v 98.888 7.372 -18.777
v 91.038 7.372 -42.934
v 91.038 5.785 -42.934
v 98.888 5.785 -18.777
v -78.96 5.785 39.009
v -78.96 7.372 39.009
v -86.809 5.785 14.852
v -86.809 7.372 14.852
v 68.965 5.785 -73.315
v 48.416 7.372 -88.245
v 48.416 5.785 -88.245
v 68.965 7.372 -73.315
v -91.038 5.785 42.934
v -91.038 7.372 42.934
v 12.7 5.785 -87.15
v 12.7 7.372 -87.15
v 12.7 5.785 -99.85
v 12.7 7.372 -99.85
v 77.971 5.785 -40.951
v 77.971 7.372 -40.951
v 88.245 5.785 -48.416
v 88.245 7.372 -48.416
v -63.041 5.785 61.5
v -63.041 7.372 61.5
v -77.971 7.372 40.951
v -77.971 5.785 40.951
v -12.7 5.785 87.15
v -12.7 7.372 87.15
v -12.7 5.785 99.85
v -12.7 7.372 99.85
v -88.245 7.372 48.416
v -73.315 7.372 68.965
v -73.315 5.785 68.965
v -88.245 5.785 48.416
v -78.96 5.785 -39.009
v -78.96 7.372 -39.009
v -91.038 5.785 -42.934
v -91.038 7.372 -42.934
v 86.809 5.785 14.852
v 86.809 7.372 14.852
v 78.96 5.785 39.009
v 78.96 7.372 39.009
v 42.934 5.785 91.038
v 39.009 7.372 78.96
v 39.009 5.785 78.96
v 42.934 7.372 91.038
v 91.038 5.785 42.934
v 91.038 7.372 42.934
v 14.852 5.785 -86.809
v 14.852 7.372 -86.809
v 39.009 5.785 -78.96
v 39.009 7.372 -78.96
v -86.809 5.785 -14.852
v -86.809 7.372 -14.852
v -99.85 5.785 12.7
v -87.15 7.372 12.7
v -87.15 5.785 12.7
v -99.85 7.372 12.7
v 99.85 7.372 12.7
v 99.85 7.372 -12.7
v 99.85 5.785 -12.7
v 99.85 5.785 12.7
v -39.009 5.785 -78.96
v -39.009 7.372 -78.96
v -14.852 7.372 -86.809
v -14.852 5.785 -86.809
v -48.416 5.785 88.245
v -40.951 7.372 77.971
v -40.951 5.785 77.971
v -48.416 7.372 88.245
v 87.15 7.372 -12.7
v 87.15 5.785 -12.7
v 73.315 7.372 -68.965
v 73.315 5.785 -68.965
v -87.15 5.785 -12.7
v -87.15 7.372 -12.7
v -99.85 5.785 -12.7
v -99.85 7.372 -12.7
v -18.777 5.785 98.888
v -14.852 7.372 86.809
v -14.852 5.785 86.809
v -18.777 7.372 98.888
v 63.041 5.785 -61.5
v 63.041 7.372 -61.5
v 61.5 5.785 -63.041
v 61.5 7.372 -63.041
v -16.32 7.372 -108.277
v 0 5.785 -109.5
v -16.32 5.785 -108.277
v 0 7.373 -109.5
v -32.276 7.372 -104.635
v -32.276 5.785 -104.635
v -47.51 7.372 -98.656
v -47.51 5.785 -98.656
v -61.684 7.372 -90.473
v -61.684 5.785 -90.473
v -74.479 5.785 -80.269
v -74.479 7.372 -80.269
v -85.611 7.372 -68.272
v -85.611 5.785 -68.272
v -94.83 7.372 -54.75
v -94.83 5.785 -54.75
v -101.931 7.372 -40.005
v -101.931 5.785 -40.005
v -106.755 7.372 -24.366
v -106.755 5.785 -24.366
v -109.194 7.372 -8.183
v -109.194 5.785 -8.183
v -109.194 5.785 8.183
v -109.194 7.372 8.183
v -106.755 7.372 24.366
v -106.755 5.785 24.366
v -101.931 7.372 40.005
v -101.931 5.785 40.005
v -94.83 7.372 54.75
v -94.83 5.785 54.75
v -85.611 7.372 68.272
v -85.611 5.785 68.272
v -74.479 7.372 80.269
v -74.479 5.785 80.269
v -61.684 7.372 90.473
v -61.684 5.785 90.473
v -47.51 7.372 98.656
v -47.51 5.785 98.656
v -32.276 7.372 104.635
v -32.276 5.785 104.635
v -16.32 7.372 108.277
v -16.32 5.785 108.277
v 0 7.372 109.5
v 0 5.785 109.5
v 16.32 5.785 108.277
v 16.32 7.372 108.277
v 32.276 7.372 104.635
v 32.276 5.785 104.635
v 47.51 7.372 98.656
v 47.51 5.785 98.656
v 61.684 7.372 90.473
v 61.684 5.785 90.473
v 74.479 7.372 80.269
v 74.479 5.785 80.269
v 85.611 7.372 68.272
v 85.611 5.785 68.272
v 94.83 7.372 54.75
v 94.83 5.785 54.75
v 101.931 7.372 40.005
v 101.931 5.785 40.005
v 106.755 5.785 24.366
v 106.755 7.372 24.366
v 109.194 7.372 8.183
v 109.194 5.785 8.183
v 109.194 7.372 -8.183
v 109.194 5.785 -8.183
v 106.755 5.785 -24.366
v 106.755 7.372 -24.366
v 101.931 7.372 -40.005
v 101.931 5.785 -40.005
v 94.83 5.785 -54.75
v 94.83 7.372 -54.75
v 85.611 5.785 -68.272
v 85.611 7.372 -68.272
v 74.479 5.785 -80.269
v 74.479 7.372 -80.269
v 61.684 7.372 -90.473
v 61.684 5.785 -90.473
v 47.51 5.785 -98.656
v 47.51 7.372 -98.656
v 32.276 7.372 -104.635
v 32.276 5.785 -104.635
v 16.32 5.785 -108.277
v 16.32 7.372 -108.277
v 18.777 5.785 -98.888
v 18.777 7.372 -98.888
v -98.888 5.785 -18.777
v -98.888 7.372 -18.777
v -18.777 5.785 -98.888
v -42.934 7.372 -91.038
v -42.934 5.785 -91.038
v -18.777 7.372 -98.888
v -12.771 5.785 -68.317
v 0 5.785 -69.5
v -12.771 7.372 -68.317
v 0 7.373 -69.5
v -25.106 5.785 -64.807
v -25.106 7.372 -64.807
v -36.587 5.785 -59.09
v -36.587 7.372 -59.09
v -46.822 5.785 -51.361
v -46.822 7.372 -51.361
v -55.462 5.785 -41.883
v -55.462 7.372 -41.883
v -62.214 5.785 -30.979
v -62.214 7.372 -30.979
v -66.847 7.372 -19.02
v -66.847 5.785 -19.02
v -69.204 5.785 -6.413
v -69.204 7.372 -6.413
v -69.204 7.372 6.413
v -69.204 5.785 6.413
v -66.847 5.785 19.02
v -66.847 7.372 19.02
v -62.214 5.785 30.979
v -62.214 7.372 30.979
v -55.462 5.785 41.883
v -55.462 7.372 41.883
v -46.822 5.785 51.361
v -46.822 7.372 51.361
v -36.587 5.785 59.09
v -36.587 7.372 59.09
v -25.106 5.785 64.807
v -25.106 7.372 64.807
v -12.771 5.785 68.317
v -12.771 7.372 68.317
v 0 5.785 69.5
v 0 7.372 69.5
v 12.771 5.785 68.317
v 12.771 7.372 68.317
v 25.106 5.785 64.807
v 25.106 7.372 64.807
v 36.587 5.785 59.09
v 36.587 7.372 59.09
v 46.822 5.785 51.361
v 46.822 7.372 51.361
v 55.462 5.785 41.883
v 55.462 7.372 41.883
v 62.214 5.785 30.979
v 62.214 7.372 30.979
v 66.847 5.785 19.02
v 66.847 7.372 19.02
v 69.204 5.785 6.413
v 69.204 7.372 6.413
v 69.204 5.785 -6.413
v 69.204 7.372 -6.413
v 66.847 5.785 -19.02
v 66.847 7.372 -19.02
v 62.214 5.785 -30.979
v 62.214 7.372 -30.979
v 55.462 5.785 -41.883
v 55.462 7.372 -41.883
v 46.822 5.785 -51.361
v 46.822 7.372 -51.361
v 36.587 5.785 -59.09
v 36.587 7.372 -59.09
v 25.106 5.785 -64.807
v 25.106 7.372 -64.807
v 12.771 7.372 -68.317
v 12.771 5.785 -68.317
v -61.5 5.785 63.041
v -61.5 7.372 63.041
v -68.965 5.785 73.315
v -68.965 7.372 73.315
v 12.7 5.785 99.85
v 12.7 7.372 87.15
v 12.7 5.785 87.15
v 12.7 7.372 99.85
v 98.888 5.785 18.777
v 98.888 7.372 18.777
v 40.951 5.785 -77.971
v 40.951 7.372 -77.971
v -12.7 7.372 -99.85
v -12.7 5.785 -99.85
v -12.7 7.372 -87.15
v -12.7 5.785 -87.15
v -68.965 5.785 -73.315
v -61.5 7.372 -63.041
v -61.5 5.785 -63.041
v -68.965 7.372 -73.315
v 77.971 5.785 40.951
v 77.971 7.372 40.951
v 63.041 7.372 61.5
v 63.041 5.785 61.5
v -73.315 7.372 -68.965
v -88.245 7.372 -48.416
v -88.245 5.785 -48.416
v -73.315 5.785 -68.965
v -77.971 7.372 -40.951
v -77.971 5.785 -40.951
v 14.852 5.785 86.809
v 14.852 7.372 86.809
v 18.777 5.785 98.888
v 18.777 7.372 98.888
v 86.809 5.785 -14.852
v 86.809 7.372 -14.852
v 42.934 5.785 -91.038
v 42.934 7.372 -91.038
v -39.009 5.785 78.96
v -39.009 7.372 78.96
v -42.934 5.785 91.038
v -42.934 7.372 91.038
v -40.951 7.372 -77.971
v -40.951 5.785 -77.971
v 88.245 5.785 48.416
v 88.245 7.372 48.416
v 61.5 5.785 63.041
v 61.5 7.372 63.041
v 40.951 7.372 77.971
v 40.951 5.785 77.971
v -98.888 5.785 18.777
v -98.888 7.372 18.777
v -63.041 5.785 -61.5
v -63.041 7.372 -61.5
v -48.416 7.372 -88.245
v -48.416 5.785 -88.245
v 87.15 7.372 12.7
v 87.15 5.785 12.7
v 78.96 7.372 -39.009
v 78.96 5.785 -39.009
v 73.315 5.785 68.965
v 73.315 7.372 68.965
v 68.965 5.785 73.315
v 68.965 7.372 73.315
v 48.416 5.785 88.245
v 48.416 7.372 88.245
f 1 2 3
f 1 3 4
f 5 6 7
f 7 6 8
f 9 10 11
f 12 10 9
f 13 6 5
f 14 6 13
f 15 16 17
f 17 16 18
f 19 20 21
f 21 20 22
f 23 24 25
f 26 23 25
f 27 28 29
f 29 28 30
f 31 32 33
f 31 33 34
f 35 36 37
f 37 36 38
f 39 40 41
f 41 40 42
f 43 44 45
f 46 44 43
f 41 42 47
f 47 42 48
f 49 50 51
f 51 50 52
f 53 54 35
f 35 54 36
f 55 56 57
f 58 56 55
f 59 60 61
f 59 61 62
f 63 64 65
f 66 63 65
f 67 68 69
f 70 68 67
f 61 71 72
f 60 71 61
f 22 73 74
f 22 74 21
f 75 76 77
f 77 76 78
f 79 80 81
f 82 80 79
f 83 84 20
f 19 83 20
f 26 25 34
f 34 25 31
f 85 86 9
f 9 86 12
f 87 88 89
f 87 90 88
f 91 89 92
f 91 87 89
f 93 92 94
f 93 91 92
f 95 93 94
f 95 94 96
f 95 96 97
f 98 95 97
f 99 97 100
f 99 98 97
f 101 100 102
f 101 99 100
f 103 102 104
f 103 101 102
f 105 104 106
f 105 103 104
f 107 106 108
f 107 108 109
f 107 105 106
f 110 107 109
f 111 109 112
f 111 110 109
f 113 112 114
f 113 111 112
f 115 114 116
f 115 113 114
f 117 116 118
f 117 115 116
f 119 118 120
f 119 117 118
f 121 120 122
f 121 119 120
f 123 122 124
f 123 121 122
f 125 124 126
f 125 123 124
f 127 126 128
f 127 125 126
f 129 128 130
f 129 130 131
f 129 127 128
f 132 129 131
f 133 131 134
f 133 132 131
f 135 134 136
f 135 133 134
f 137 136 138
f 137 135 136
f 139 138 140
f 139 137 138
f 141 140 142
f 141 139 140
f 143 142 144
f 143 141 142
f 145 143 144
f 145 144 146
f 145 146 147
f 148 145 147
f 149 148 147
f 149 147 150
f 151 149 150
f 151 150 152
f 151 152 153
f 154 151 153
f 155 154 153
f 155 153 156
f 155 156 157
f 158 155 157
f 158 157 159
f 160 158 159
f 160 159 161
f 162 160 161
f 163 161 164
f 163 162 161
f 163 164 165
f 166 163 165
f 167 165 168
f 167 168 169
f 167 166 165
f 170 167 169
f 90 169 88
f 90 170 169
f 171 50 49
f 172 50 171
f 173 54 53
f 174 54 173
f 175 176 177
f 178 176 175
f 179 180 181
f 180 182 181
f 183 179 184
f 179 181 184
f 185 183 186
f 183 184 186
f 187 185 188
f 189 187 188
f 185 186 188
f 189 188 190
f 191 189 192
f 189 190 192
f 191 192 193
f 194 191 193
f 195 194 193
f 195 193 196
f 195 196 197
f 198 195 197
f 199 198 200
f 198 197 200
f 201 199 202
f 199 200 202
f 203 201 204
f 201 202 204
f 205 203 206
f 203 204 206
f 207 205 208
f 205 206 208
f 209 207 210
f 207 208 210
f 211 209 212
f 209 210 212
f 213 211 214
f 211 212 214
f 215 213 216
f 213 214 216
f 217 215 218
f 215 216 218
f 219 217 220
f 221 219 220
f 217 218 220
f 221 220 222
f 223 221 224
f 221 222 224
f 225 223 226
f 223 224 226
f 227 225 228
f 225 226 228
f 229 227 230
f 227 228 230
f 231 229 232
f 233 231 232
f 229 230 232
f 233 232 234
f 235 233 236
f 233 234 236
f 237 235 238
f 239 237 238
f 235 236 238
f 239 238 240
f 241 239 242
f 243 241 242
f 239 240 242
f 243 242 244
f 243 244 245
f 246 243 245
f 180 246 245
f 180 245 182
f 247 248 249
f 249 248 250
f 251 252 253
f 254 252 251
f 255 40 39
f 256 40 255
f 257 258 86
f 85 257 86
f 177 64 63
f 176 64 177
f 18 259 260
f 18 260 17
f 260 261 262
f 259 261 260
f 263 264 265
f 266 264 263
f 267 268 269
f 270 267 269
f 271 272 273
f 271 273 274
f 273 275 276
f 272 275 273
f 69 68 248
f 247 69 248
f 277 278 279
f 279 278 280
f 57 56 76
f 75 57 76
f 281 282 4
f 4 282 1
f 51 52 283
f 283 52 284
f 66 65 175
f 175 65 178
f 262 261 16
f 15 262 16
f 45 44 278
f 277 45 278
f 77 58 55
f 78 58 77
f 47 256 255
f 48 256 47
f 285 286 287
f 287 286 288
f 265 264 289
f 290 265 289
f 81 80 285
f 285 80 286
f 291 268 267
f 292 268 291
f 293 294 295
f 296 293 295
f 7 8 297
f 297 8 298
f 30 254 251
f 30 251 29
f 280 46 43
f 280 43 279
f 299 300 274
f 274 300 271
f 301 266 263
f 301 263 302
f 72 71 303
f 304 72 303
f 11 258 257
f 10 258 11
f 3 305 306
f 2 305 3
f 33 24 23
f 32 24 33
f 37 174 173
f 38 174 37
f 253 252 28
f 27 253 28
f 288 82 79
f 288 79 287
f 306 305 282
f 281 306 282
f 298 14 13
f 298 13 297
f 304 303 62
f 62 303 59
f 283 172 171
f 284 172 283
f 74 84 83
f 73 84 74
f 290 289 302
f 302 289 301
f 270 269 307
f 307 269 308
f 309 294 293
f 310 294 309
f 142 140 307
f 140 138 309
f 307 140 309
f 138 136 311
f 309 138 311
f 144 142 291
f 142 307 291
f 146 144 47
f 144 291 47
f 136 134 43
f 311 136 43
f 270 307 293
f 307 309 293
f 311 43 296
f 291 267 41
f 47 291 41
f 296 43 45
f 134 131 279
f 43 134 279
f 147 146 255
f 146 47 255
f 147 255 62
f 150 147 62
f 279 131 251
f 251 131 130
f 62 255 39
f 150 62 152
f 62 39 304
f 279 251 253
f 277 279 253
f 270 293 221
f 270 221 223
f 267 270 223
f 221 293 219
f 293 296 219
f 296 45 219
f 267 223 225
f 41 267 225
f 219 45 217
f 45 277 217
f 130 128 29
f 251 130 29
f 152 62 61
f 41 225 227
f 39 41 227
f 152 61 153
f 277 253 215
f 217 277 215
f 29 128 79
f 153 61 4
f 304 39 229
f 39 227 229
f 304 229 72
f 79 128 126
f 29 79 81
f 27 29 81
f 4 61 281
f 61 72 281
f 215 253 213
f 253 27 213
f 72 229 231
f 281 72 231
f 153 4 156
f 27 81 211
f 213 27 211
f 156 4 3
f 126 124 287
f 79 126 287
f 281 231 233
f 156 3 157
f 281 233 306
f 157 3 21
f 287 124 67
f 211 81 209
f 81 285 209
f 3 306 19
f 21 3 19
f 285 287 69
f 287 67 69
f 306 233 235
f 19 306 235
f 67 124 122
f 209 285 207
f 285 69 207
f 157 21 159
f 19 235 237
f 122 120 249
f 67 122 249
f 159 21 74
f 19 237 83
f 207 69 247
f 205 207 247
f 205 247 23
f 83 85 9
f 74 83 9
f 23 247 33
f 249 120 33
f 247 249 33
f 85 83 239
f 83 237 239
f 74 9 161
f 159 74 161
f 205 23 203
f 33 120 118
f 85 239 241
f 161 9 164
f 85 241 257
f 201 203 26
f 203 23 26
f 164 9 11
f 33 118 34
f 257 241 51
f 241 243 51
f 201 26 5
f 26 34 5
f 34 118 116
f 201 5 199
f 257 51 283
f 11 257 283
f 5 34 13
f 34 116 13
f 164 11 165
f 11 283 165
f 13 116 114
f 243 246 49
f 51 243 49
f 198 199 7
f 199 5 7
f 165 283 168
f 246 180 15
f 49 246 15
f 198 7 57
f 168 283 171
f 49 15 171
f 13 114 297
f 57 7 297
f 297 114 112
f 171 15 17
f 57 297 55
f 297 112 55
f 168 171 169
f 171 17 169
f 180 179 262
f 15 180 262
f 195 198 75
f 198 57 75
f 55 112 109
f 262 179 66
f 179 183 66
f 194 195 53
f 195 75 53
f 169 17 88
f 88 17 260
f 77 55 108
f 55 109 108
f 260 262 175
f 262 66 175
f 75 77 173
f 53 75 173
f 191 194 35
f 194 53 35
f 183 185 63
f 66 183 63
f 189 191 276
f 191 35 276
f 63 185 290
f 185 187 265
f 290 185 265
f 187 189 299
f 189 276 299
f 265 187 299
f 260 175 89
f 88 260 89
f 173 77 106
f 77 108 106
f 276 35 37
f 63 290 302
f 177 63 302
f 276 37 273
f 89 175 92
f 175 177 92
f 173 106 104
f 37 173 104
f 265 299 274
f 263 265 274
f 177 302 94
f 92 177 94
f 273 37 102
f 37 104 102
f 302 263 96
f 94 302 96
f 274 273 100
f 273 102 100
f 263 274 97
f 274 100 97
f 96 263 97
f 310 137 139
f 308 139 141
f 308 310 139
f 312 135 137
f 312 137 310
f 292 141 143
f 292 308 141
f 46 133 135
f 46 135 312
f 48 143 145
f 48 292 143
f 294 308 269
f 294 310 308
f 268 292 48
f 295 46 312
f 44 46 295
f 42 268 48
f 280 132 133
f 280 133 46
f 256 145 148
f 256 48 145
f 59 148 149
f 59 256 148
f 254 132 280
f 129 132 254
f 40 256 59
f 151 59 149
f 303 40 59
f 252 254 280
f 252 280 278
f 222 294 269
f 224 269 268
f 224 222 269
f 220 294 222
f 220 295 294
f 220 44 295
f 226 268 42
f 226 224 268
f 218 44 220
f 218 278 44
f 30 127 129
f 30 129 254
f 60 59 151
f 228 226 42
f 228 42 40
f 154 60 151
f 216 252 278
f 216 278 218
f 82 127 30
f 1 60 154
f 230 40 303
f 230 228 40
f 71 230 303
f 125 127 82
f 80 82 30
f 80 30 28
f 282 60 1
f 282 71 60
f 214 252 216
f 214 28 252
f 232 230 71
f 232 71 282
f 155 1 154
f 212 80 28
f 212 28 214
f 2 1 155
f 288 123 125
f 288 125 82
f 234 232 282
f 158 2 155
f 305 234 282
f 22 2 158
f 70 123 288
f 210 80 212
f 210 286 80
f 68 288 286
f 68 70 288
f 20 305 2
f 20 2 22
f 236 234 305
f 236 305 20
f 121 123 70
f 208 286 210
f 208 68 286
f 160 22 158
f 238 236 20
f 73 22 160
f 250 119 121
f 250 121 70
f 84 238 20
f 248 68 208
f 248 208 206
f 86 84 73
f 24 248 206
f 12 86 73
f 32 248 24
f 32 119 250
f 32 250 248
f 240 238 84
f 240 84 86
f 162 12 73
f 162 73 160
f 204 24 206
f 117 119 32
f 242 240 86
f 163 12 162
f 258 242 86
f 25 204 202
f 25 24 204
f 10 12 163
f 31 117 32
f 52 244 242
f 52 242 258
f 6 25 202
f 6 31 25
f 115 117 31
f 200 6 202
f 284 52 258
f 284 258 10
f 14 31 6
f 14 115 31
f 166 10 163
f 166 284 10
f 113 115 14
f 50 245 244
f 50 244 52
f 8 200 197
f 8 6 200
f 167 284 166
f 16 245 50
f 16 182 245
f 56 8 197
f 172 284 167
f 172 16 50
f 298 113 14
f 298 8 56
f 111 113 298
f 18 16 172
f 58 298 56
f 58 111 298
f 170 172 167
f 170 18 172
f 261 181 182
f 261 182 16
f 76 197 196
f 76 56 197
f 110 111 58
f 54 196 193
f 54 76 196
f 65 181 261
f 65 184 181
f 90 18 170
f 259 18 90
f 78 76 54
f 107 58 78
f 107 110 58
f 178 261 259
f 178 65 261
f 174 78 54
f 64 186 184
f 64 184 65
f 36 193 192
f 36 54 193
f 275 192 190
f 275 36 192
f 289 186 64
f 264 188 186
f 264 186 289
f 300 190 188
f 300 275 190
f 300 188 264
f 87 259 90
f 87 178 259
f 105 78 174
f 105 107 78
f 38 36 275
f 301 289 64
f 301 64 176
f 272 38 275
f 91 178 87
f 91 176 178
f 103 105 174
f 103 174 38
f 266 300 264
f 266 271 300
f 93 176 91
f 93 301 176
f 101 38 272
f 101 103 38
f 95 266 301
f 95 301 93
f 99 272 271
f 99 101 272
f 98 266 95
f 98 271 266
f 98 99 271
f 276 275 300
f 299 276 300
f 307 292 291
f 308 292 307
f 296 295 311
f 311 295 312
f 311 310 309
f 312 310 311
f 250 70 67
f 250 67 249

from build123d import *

# Parameters (mm, degrees)
SKETCH1_W          = 40
SKETCH1_H          = 1.5875
SKETCH2_W          = 25.4
SKETCH2_H          = 12.7
CUT_EXTRUDE1_DEPTH = 155.864521942
CIRPATTERN1_COUNT  = 20


with BuildPart() as part:
    # Sketch1 → Revolve1 (revolve)
    with BuildSketch(Plane.XY, mode=Mode.PRIVATE) as revolve1_sk:
        with Locations((-89.5, 6.57875)):
            Rectangle(SKETCH1_W, SKETCH1_H)
    revolve(revolve1_sk.sketch.rotate(Axis((0, -200069.047495165, 0), (0, 1, 0)), 270), axis=Axis((0, -200069.047495165, 0), (0, 1, 0)))

    # Sketch2 → Cut-Extrude1 (cut, through all)
    with BuildSketch(Plane(origin=(0, 7.3725, 0), x_dir=(1, 0, 0), z_dir=(0, 1, 0))):
        with Locations((0, 93.5)):
            Rectangle(SKETCH2_W, SKETCH2_H)
    cut_extrude1 = extrude(amount=-CUT_EXTRUDE1_DEPTH, mode=Mode.SUBTRACT)

    # CirPattern1: Cut-Extrude1 ×20 about axis
    cirpattern1_axis = Axis((0, 0, 0), (0, 1, 0))
    for i in range(1, CIRPATTERN1_COUNT):
        add(cut_extrude1.rotate(cirpattern1_axis, i * 360 / CIRPATTERN1_COUNT), mode=Mode.SUBTRACT)


solid = part.part
